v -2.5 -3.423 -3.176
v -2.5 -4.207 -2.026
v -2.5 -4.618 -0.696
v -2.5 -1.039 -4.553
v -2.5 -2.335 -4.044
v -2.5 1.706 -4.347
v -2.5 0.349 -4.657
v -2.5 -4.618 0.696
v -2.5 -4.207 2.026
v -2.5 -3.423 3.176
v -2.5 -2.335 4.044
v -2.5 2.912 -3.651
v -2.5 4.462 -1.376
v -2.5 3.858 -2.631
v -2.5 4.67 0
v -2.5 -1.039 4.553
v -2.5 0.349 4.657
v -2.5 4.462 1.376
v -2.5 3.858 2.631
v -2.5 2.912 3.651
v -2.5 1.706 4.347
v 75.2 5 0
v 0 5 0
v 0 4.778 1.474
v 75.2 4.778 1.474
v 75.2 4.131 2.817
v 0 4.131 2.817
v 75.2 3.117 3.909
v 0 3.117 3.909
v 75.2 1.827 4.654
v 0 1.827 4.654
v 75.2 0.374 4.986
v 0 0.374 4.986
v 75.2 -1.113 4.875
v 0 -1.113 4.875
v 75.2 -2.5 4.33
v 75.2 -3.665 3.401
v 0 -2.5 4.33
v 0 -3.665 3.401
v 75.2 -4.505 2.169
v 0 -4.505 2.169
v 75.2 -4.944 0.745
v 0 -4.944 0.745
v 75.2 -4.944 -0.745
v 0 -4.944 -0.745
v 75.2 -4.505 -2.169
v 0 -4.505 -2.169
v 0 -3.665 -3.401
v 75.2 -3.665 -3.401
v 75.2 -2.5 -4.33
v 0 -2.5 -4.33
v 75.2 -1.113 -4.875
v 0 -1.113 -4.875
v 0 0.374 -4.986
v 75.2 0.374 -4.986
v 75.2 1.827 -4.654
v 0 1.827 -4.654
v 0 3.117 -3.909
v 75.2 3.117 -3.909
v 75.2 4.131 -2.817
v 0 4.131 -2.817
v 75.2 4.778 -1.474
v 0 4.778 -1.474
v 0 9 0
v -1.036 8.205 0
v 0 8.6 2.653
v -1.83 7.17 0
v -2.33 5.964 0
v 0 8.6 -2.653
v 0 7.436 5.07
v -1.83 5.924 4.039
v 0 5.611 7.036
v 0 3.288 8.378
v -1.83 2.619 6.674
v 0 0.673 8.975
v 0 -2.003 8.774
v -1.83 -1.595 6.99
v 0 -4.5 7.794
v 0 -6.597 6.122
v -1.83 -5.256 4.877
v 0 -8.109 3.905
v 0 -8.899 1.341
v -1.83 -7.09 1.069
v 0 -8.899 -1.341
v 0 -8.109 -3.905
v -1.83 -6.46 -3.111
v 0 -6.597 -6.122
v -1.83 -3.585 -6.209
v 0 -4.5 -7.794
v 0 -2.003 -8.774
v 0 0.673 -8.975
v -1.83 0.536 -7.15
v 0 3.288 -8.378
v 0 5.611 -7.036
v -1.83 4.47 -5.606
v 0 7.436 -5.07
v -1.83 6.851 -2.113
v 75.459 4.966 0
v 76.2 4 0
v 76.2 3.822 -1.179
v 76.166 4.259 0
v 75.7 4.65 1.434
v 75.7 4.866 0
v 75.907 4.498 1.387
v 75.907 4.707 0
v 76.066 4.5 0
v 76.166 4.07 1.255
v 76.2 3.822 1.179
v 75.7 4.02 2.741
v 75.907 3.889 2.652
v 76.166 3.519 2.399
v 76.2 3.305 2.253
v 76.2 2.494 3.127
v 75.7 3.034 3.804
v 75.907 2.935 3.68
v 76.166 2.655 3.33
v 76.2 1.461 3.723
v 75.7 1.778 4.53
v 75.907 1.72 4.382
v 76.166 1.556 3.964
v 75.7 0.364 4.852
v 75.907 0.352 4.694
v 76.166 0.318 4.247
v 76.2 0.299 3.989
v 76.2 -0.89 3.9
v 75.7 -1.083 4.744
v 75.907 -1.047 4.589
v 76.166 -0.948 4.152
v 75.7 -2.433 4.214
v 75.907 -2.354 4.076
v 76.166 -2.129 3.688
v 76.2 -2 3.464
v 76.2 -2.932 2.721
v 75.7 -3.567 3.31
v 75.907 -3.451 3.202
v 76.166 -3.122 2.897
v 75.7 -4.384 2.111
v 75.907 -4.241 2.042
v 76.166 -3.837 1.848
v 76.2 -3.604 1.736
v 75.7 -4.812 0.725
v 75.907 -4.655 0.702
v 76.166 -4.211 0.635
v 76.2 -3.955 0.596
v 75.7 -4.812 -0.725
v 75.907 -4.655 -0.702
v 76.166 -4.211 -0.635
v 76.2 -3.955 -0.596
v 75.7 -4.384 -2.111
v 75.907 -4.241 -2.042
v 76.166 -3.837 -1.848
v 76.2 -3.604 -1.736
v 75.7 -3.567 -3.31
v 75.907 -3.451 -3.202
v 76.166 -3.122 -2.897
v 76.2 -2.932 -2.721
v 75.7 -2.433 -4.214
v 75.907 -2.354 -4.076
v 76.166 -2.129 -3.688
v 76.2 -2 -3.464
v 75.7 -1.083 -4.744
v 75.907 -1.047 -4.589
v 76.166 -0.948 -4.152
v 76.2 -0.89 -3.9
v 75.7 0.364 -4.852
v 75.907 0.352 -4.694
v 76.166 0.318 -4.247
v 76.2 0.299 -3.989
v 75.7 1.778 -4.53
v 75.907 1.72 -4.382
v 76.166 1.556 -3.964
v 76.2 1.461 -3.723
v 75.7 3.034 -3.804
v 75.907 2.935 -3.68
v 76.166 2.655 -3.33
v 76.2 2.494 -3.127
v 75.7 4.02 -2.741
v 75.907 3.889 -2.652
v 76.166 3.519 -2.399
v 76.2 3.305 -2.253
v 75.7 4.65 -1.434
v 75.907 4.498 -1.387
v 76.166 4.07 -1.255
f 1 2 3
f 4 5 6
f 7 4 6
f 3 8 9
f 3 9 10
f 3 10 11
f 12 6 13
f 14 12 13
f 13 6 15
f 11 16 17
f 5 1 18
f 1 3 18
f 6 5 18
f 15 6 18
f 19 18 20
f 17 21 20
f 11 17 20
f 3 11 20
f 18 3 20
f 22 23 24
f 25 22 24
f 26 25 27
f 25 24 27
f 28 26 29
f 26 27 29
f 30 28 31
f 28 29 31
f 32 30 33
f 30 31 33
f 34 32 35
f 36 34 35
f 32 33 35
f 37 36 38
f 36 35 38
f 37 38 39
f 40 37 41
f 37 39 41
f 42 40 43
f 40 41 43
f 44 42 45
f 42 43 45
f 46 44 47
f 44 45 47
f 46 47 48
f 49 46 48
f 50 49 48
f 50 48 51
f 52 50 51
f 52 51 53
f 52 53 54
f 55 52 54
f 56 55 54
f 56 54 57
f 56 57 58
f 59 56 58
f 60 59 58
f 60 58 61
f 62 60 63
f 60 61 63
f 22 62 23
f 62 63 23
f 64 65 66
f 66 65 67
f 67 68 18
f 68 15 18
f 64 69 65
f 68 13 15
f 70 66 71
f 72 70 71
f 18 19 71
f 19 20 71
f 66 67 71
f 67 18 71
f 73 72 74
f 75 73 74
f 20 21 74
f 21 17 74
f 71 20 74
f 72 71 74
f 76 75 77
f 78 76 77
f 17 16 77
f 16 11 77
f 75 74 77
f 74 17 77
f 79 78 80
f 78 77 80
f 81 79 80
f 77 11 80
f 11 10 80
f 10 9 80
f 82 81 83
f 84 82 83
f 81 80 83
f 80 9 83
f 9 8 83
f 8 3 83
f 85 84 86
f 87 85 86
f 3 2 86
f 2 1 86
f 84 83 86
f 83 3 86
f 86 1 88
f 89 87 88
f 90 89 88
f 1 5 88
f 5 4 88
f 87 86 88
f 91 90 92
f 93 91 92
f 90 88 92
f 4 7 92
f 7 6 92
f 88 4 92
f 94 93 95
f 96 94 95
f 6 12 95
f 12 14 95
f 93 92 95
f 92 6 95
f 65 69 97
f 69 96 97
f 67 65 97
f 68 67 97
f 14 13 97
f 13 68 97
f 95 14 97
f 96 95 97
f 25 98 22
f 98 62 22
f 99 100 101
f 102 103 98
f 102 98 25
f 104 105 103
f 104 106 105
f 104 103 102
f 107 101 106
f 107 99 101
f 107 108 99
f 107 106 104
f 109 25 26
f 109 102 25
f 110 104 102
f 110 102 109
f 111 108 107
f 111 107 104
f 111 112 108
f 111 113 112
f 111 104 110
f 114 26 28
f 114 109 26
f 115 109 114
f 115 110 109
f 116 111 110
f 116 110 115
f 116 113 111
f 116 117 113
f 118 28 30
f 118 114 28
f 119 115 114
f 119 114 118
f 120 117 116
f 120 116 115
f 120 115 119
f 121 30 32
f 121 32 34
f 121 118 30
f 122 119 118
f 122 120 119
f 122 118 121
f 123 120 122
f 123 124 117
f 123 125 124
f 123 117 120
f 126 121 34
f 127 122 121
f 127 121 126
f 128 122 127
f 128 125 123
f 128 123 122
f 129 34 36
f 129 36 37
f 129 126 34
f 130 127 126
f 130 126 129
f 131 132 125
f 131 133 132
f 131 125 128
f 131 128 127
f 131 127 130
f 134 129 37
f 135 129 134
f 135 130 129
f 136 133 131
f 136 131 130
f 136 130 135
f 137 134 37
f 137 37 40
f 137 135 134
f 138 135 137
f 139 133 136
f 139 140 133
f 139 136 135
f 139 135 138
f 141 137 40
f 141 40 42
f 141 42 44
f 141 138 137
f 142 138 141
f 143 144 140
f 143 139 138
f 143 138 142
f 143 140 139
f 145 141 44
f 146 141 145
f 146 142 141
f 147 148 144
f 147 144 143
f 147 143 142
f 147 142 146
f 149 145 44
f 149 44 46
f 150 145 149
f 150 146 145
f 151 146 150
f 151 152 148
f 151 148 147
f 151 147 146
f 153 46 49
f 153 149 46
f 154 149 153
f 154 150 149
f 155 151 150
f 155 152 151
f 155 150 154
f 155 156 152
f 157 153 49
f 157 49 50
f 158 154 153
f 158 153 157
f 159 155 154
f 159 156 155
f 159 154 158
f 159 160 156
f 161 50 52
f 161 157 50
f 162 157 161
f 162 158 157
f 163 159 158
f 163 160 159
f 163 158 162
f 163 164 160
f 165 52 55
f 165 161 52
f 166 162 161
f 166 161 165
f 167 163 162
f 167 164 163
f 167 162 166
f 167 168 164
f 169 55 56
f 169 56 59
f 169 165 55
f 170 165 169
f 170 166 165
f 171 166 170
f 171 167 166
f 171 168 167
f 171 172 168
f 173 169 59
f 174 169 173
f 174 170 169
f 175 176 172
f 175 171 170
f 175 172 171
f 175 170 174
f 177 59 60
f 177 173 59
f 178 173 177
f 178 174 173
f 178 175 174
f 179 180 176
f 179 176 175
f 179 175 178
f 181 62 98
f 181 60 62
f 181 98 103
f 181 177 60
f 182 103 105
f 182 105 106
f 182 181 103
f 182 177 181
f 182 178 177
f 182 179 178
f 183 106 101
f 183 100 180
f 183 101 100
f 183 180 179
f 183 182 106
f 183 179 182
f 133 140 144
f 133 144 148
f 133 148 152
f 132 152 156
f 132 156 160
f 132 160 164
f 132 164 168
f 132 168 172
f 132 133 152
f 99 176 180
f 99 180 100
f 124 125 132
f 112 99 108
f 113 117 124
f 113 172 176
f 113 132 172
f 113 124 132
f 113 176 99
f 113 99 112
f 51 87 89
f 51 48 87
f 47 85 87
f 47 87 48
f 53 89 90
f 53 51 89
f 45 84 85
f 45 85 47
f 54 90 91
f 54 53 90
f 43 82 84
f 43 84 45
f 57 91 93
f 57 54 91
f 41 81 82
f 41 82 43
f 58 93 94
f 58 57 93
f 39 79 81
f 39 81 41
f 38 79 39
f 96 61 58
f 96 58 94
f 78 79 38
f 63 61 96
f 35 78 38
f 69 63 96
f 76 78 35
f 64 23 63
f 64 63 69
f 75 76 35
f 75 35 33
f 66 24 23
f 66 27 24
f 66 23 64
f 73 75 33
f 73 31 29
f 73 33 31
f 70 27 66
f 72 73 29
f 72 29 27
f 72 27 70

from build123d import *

# Parameters (mm, degrees)
F0_R     = 5
F2_DEPTH = 76.2
F1_R     = 9
F3_DEPTH = 2.5
F5_R     = 1


# Not quite as in the source:
# - a fillet or chamfer that OpenCascade refuses, or shapes differently, is made with other operations: its cross-section is extruded or revolved along the edge and cut away or added


with BuildPart() as f2:
    # F0 (on Right) → F2 (new body)
    with BuildSketch(Plane.YZ):
        Circle(F0_R)
    extrude(amount=F2_DEPTH)

    # F1 (on Right) → F3 (join)
    with BuildSketch(Plane.YZ):
        Circle(F1_R)
    extrude(amount=-F3_DEPTH)

    # F4: fillet of radius 5 on 1 edges, made by hand

    # F4_s1 → F4_t2 (revolve, cut)
    with BuildSketch(Plane.XY):
        with BuildLine():
            ThreePointArc((0, 9), (-1.8301270189, 7.1698729811), (-2.5, 4.6698729811))
            Line((-2.5, 4.6698729811), (-2.5, 9))
            Line((-2.5, 9), (0, 9))
        make_face()
    revolve(axis=Axis((-2.5, 0, 0), (1, 0, 0)), mode=Mode.SUBTRACT)

    # F5
    f5_edges = [f2.edges().sort_by_distance(p)[0] for p in [
        (76.2, -5, 0),
    ]]
    fillet(f5_edges, radius=F5_R)


solid = f2.part
